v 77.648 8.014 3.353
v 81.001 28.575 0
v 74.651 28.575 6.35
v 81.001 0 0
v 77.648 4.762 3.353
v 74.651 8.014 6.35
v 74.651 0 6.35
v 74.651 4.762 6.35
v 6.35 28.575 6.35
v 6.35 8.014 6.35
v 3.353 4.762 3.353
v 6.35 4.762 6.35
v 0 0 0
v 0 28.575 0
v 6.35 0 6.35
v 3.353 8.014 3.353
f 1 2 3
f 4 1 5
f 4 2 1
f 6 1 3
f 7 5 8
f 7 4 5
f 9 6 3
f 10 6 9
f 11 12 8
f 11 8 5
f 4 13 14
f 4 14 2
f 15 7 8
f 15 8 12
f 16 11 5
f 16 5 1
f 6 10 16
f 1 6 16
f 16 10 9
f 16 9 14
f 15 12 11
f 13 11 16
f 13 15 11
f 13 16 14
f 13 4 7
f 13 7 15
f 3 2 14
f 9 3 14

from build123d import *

# Parameters (mm, degrees)
BOSS_EXTRUDE1_DEPTH     = 28.575
SKETCH2_W               = 2.9972
SKETCH2_H               = 3.2512
CUT_EXTRUDE1_DEPTH      = 82.0006
CUT_EXTRUDE1_DEPTH_BACK = 1


with BuildPart() as part:
    # Sketch1 → Boss-Extrude1 (new body)
    with BuildSketch(Plane(origin=(0, 0, 0), x_dir=(1, 0, 0), z_dir=(0, 1, 0))):
        Polygon((0, 0), (81.0006, 0), (74.6506, -6.35), (6.35, -6.35), align=None)
    extrude(amount=BOSS_EXTRUDE1_DEPTH)

    # Sketch2 → Cut-Extrude1 (cut, two sides)
    with BuildSketch(Plane(origin=(0, 0, 0), x_dir=(0, 0, -1), z_dir=(1, 0, 0))) as cut_extrude1_sk:
        with Locations((-4.8514, 6.3881)):
            Rectangle(SKETCH2_W, SKETCH2_H)
    extrude(amount=CUT_EXTRUDE1_DEPTH, mode=Mode.SUBTRACT)
    extrude(cut_extrude1_sk.sketch, amount=-CUT_EXTRUDE1_DEPTH_BACK, mode=Mode.SUBTRACT)


solid = part.part
